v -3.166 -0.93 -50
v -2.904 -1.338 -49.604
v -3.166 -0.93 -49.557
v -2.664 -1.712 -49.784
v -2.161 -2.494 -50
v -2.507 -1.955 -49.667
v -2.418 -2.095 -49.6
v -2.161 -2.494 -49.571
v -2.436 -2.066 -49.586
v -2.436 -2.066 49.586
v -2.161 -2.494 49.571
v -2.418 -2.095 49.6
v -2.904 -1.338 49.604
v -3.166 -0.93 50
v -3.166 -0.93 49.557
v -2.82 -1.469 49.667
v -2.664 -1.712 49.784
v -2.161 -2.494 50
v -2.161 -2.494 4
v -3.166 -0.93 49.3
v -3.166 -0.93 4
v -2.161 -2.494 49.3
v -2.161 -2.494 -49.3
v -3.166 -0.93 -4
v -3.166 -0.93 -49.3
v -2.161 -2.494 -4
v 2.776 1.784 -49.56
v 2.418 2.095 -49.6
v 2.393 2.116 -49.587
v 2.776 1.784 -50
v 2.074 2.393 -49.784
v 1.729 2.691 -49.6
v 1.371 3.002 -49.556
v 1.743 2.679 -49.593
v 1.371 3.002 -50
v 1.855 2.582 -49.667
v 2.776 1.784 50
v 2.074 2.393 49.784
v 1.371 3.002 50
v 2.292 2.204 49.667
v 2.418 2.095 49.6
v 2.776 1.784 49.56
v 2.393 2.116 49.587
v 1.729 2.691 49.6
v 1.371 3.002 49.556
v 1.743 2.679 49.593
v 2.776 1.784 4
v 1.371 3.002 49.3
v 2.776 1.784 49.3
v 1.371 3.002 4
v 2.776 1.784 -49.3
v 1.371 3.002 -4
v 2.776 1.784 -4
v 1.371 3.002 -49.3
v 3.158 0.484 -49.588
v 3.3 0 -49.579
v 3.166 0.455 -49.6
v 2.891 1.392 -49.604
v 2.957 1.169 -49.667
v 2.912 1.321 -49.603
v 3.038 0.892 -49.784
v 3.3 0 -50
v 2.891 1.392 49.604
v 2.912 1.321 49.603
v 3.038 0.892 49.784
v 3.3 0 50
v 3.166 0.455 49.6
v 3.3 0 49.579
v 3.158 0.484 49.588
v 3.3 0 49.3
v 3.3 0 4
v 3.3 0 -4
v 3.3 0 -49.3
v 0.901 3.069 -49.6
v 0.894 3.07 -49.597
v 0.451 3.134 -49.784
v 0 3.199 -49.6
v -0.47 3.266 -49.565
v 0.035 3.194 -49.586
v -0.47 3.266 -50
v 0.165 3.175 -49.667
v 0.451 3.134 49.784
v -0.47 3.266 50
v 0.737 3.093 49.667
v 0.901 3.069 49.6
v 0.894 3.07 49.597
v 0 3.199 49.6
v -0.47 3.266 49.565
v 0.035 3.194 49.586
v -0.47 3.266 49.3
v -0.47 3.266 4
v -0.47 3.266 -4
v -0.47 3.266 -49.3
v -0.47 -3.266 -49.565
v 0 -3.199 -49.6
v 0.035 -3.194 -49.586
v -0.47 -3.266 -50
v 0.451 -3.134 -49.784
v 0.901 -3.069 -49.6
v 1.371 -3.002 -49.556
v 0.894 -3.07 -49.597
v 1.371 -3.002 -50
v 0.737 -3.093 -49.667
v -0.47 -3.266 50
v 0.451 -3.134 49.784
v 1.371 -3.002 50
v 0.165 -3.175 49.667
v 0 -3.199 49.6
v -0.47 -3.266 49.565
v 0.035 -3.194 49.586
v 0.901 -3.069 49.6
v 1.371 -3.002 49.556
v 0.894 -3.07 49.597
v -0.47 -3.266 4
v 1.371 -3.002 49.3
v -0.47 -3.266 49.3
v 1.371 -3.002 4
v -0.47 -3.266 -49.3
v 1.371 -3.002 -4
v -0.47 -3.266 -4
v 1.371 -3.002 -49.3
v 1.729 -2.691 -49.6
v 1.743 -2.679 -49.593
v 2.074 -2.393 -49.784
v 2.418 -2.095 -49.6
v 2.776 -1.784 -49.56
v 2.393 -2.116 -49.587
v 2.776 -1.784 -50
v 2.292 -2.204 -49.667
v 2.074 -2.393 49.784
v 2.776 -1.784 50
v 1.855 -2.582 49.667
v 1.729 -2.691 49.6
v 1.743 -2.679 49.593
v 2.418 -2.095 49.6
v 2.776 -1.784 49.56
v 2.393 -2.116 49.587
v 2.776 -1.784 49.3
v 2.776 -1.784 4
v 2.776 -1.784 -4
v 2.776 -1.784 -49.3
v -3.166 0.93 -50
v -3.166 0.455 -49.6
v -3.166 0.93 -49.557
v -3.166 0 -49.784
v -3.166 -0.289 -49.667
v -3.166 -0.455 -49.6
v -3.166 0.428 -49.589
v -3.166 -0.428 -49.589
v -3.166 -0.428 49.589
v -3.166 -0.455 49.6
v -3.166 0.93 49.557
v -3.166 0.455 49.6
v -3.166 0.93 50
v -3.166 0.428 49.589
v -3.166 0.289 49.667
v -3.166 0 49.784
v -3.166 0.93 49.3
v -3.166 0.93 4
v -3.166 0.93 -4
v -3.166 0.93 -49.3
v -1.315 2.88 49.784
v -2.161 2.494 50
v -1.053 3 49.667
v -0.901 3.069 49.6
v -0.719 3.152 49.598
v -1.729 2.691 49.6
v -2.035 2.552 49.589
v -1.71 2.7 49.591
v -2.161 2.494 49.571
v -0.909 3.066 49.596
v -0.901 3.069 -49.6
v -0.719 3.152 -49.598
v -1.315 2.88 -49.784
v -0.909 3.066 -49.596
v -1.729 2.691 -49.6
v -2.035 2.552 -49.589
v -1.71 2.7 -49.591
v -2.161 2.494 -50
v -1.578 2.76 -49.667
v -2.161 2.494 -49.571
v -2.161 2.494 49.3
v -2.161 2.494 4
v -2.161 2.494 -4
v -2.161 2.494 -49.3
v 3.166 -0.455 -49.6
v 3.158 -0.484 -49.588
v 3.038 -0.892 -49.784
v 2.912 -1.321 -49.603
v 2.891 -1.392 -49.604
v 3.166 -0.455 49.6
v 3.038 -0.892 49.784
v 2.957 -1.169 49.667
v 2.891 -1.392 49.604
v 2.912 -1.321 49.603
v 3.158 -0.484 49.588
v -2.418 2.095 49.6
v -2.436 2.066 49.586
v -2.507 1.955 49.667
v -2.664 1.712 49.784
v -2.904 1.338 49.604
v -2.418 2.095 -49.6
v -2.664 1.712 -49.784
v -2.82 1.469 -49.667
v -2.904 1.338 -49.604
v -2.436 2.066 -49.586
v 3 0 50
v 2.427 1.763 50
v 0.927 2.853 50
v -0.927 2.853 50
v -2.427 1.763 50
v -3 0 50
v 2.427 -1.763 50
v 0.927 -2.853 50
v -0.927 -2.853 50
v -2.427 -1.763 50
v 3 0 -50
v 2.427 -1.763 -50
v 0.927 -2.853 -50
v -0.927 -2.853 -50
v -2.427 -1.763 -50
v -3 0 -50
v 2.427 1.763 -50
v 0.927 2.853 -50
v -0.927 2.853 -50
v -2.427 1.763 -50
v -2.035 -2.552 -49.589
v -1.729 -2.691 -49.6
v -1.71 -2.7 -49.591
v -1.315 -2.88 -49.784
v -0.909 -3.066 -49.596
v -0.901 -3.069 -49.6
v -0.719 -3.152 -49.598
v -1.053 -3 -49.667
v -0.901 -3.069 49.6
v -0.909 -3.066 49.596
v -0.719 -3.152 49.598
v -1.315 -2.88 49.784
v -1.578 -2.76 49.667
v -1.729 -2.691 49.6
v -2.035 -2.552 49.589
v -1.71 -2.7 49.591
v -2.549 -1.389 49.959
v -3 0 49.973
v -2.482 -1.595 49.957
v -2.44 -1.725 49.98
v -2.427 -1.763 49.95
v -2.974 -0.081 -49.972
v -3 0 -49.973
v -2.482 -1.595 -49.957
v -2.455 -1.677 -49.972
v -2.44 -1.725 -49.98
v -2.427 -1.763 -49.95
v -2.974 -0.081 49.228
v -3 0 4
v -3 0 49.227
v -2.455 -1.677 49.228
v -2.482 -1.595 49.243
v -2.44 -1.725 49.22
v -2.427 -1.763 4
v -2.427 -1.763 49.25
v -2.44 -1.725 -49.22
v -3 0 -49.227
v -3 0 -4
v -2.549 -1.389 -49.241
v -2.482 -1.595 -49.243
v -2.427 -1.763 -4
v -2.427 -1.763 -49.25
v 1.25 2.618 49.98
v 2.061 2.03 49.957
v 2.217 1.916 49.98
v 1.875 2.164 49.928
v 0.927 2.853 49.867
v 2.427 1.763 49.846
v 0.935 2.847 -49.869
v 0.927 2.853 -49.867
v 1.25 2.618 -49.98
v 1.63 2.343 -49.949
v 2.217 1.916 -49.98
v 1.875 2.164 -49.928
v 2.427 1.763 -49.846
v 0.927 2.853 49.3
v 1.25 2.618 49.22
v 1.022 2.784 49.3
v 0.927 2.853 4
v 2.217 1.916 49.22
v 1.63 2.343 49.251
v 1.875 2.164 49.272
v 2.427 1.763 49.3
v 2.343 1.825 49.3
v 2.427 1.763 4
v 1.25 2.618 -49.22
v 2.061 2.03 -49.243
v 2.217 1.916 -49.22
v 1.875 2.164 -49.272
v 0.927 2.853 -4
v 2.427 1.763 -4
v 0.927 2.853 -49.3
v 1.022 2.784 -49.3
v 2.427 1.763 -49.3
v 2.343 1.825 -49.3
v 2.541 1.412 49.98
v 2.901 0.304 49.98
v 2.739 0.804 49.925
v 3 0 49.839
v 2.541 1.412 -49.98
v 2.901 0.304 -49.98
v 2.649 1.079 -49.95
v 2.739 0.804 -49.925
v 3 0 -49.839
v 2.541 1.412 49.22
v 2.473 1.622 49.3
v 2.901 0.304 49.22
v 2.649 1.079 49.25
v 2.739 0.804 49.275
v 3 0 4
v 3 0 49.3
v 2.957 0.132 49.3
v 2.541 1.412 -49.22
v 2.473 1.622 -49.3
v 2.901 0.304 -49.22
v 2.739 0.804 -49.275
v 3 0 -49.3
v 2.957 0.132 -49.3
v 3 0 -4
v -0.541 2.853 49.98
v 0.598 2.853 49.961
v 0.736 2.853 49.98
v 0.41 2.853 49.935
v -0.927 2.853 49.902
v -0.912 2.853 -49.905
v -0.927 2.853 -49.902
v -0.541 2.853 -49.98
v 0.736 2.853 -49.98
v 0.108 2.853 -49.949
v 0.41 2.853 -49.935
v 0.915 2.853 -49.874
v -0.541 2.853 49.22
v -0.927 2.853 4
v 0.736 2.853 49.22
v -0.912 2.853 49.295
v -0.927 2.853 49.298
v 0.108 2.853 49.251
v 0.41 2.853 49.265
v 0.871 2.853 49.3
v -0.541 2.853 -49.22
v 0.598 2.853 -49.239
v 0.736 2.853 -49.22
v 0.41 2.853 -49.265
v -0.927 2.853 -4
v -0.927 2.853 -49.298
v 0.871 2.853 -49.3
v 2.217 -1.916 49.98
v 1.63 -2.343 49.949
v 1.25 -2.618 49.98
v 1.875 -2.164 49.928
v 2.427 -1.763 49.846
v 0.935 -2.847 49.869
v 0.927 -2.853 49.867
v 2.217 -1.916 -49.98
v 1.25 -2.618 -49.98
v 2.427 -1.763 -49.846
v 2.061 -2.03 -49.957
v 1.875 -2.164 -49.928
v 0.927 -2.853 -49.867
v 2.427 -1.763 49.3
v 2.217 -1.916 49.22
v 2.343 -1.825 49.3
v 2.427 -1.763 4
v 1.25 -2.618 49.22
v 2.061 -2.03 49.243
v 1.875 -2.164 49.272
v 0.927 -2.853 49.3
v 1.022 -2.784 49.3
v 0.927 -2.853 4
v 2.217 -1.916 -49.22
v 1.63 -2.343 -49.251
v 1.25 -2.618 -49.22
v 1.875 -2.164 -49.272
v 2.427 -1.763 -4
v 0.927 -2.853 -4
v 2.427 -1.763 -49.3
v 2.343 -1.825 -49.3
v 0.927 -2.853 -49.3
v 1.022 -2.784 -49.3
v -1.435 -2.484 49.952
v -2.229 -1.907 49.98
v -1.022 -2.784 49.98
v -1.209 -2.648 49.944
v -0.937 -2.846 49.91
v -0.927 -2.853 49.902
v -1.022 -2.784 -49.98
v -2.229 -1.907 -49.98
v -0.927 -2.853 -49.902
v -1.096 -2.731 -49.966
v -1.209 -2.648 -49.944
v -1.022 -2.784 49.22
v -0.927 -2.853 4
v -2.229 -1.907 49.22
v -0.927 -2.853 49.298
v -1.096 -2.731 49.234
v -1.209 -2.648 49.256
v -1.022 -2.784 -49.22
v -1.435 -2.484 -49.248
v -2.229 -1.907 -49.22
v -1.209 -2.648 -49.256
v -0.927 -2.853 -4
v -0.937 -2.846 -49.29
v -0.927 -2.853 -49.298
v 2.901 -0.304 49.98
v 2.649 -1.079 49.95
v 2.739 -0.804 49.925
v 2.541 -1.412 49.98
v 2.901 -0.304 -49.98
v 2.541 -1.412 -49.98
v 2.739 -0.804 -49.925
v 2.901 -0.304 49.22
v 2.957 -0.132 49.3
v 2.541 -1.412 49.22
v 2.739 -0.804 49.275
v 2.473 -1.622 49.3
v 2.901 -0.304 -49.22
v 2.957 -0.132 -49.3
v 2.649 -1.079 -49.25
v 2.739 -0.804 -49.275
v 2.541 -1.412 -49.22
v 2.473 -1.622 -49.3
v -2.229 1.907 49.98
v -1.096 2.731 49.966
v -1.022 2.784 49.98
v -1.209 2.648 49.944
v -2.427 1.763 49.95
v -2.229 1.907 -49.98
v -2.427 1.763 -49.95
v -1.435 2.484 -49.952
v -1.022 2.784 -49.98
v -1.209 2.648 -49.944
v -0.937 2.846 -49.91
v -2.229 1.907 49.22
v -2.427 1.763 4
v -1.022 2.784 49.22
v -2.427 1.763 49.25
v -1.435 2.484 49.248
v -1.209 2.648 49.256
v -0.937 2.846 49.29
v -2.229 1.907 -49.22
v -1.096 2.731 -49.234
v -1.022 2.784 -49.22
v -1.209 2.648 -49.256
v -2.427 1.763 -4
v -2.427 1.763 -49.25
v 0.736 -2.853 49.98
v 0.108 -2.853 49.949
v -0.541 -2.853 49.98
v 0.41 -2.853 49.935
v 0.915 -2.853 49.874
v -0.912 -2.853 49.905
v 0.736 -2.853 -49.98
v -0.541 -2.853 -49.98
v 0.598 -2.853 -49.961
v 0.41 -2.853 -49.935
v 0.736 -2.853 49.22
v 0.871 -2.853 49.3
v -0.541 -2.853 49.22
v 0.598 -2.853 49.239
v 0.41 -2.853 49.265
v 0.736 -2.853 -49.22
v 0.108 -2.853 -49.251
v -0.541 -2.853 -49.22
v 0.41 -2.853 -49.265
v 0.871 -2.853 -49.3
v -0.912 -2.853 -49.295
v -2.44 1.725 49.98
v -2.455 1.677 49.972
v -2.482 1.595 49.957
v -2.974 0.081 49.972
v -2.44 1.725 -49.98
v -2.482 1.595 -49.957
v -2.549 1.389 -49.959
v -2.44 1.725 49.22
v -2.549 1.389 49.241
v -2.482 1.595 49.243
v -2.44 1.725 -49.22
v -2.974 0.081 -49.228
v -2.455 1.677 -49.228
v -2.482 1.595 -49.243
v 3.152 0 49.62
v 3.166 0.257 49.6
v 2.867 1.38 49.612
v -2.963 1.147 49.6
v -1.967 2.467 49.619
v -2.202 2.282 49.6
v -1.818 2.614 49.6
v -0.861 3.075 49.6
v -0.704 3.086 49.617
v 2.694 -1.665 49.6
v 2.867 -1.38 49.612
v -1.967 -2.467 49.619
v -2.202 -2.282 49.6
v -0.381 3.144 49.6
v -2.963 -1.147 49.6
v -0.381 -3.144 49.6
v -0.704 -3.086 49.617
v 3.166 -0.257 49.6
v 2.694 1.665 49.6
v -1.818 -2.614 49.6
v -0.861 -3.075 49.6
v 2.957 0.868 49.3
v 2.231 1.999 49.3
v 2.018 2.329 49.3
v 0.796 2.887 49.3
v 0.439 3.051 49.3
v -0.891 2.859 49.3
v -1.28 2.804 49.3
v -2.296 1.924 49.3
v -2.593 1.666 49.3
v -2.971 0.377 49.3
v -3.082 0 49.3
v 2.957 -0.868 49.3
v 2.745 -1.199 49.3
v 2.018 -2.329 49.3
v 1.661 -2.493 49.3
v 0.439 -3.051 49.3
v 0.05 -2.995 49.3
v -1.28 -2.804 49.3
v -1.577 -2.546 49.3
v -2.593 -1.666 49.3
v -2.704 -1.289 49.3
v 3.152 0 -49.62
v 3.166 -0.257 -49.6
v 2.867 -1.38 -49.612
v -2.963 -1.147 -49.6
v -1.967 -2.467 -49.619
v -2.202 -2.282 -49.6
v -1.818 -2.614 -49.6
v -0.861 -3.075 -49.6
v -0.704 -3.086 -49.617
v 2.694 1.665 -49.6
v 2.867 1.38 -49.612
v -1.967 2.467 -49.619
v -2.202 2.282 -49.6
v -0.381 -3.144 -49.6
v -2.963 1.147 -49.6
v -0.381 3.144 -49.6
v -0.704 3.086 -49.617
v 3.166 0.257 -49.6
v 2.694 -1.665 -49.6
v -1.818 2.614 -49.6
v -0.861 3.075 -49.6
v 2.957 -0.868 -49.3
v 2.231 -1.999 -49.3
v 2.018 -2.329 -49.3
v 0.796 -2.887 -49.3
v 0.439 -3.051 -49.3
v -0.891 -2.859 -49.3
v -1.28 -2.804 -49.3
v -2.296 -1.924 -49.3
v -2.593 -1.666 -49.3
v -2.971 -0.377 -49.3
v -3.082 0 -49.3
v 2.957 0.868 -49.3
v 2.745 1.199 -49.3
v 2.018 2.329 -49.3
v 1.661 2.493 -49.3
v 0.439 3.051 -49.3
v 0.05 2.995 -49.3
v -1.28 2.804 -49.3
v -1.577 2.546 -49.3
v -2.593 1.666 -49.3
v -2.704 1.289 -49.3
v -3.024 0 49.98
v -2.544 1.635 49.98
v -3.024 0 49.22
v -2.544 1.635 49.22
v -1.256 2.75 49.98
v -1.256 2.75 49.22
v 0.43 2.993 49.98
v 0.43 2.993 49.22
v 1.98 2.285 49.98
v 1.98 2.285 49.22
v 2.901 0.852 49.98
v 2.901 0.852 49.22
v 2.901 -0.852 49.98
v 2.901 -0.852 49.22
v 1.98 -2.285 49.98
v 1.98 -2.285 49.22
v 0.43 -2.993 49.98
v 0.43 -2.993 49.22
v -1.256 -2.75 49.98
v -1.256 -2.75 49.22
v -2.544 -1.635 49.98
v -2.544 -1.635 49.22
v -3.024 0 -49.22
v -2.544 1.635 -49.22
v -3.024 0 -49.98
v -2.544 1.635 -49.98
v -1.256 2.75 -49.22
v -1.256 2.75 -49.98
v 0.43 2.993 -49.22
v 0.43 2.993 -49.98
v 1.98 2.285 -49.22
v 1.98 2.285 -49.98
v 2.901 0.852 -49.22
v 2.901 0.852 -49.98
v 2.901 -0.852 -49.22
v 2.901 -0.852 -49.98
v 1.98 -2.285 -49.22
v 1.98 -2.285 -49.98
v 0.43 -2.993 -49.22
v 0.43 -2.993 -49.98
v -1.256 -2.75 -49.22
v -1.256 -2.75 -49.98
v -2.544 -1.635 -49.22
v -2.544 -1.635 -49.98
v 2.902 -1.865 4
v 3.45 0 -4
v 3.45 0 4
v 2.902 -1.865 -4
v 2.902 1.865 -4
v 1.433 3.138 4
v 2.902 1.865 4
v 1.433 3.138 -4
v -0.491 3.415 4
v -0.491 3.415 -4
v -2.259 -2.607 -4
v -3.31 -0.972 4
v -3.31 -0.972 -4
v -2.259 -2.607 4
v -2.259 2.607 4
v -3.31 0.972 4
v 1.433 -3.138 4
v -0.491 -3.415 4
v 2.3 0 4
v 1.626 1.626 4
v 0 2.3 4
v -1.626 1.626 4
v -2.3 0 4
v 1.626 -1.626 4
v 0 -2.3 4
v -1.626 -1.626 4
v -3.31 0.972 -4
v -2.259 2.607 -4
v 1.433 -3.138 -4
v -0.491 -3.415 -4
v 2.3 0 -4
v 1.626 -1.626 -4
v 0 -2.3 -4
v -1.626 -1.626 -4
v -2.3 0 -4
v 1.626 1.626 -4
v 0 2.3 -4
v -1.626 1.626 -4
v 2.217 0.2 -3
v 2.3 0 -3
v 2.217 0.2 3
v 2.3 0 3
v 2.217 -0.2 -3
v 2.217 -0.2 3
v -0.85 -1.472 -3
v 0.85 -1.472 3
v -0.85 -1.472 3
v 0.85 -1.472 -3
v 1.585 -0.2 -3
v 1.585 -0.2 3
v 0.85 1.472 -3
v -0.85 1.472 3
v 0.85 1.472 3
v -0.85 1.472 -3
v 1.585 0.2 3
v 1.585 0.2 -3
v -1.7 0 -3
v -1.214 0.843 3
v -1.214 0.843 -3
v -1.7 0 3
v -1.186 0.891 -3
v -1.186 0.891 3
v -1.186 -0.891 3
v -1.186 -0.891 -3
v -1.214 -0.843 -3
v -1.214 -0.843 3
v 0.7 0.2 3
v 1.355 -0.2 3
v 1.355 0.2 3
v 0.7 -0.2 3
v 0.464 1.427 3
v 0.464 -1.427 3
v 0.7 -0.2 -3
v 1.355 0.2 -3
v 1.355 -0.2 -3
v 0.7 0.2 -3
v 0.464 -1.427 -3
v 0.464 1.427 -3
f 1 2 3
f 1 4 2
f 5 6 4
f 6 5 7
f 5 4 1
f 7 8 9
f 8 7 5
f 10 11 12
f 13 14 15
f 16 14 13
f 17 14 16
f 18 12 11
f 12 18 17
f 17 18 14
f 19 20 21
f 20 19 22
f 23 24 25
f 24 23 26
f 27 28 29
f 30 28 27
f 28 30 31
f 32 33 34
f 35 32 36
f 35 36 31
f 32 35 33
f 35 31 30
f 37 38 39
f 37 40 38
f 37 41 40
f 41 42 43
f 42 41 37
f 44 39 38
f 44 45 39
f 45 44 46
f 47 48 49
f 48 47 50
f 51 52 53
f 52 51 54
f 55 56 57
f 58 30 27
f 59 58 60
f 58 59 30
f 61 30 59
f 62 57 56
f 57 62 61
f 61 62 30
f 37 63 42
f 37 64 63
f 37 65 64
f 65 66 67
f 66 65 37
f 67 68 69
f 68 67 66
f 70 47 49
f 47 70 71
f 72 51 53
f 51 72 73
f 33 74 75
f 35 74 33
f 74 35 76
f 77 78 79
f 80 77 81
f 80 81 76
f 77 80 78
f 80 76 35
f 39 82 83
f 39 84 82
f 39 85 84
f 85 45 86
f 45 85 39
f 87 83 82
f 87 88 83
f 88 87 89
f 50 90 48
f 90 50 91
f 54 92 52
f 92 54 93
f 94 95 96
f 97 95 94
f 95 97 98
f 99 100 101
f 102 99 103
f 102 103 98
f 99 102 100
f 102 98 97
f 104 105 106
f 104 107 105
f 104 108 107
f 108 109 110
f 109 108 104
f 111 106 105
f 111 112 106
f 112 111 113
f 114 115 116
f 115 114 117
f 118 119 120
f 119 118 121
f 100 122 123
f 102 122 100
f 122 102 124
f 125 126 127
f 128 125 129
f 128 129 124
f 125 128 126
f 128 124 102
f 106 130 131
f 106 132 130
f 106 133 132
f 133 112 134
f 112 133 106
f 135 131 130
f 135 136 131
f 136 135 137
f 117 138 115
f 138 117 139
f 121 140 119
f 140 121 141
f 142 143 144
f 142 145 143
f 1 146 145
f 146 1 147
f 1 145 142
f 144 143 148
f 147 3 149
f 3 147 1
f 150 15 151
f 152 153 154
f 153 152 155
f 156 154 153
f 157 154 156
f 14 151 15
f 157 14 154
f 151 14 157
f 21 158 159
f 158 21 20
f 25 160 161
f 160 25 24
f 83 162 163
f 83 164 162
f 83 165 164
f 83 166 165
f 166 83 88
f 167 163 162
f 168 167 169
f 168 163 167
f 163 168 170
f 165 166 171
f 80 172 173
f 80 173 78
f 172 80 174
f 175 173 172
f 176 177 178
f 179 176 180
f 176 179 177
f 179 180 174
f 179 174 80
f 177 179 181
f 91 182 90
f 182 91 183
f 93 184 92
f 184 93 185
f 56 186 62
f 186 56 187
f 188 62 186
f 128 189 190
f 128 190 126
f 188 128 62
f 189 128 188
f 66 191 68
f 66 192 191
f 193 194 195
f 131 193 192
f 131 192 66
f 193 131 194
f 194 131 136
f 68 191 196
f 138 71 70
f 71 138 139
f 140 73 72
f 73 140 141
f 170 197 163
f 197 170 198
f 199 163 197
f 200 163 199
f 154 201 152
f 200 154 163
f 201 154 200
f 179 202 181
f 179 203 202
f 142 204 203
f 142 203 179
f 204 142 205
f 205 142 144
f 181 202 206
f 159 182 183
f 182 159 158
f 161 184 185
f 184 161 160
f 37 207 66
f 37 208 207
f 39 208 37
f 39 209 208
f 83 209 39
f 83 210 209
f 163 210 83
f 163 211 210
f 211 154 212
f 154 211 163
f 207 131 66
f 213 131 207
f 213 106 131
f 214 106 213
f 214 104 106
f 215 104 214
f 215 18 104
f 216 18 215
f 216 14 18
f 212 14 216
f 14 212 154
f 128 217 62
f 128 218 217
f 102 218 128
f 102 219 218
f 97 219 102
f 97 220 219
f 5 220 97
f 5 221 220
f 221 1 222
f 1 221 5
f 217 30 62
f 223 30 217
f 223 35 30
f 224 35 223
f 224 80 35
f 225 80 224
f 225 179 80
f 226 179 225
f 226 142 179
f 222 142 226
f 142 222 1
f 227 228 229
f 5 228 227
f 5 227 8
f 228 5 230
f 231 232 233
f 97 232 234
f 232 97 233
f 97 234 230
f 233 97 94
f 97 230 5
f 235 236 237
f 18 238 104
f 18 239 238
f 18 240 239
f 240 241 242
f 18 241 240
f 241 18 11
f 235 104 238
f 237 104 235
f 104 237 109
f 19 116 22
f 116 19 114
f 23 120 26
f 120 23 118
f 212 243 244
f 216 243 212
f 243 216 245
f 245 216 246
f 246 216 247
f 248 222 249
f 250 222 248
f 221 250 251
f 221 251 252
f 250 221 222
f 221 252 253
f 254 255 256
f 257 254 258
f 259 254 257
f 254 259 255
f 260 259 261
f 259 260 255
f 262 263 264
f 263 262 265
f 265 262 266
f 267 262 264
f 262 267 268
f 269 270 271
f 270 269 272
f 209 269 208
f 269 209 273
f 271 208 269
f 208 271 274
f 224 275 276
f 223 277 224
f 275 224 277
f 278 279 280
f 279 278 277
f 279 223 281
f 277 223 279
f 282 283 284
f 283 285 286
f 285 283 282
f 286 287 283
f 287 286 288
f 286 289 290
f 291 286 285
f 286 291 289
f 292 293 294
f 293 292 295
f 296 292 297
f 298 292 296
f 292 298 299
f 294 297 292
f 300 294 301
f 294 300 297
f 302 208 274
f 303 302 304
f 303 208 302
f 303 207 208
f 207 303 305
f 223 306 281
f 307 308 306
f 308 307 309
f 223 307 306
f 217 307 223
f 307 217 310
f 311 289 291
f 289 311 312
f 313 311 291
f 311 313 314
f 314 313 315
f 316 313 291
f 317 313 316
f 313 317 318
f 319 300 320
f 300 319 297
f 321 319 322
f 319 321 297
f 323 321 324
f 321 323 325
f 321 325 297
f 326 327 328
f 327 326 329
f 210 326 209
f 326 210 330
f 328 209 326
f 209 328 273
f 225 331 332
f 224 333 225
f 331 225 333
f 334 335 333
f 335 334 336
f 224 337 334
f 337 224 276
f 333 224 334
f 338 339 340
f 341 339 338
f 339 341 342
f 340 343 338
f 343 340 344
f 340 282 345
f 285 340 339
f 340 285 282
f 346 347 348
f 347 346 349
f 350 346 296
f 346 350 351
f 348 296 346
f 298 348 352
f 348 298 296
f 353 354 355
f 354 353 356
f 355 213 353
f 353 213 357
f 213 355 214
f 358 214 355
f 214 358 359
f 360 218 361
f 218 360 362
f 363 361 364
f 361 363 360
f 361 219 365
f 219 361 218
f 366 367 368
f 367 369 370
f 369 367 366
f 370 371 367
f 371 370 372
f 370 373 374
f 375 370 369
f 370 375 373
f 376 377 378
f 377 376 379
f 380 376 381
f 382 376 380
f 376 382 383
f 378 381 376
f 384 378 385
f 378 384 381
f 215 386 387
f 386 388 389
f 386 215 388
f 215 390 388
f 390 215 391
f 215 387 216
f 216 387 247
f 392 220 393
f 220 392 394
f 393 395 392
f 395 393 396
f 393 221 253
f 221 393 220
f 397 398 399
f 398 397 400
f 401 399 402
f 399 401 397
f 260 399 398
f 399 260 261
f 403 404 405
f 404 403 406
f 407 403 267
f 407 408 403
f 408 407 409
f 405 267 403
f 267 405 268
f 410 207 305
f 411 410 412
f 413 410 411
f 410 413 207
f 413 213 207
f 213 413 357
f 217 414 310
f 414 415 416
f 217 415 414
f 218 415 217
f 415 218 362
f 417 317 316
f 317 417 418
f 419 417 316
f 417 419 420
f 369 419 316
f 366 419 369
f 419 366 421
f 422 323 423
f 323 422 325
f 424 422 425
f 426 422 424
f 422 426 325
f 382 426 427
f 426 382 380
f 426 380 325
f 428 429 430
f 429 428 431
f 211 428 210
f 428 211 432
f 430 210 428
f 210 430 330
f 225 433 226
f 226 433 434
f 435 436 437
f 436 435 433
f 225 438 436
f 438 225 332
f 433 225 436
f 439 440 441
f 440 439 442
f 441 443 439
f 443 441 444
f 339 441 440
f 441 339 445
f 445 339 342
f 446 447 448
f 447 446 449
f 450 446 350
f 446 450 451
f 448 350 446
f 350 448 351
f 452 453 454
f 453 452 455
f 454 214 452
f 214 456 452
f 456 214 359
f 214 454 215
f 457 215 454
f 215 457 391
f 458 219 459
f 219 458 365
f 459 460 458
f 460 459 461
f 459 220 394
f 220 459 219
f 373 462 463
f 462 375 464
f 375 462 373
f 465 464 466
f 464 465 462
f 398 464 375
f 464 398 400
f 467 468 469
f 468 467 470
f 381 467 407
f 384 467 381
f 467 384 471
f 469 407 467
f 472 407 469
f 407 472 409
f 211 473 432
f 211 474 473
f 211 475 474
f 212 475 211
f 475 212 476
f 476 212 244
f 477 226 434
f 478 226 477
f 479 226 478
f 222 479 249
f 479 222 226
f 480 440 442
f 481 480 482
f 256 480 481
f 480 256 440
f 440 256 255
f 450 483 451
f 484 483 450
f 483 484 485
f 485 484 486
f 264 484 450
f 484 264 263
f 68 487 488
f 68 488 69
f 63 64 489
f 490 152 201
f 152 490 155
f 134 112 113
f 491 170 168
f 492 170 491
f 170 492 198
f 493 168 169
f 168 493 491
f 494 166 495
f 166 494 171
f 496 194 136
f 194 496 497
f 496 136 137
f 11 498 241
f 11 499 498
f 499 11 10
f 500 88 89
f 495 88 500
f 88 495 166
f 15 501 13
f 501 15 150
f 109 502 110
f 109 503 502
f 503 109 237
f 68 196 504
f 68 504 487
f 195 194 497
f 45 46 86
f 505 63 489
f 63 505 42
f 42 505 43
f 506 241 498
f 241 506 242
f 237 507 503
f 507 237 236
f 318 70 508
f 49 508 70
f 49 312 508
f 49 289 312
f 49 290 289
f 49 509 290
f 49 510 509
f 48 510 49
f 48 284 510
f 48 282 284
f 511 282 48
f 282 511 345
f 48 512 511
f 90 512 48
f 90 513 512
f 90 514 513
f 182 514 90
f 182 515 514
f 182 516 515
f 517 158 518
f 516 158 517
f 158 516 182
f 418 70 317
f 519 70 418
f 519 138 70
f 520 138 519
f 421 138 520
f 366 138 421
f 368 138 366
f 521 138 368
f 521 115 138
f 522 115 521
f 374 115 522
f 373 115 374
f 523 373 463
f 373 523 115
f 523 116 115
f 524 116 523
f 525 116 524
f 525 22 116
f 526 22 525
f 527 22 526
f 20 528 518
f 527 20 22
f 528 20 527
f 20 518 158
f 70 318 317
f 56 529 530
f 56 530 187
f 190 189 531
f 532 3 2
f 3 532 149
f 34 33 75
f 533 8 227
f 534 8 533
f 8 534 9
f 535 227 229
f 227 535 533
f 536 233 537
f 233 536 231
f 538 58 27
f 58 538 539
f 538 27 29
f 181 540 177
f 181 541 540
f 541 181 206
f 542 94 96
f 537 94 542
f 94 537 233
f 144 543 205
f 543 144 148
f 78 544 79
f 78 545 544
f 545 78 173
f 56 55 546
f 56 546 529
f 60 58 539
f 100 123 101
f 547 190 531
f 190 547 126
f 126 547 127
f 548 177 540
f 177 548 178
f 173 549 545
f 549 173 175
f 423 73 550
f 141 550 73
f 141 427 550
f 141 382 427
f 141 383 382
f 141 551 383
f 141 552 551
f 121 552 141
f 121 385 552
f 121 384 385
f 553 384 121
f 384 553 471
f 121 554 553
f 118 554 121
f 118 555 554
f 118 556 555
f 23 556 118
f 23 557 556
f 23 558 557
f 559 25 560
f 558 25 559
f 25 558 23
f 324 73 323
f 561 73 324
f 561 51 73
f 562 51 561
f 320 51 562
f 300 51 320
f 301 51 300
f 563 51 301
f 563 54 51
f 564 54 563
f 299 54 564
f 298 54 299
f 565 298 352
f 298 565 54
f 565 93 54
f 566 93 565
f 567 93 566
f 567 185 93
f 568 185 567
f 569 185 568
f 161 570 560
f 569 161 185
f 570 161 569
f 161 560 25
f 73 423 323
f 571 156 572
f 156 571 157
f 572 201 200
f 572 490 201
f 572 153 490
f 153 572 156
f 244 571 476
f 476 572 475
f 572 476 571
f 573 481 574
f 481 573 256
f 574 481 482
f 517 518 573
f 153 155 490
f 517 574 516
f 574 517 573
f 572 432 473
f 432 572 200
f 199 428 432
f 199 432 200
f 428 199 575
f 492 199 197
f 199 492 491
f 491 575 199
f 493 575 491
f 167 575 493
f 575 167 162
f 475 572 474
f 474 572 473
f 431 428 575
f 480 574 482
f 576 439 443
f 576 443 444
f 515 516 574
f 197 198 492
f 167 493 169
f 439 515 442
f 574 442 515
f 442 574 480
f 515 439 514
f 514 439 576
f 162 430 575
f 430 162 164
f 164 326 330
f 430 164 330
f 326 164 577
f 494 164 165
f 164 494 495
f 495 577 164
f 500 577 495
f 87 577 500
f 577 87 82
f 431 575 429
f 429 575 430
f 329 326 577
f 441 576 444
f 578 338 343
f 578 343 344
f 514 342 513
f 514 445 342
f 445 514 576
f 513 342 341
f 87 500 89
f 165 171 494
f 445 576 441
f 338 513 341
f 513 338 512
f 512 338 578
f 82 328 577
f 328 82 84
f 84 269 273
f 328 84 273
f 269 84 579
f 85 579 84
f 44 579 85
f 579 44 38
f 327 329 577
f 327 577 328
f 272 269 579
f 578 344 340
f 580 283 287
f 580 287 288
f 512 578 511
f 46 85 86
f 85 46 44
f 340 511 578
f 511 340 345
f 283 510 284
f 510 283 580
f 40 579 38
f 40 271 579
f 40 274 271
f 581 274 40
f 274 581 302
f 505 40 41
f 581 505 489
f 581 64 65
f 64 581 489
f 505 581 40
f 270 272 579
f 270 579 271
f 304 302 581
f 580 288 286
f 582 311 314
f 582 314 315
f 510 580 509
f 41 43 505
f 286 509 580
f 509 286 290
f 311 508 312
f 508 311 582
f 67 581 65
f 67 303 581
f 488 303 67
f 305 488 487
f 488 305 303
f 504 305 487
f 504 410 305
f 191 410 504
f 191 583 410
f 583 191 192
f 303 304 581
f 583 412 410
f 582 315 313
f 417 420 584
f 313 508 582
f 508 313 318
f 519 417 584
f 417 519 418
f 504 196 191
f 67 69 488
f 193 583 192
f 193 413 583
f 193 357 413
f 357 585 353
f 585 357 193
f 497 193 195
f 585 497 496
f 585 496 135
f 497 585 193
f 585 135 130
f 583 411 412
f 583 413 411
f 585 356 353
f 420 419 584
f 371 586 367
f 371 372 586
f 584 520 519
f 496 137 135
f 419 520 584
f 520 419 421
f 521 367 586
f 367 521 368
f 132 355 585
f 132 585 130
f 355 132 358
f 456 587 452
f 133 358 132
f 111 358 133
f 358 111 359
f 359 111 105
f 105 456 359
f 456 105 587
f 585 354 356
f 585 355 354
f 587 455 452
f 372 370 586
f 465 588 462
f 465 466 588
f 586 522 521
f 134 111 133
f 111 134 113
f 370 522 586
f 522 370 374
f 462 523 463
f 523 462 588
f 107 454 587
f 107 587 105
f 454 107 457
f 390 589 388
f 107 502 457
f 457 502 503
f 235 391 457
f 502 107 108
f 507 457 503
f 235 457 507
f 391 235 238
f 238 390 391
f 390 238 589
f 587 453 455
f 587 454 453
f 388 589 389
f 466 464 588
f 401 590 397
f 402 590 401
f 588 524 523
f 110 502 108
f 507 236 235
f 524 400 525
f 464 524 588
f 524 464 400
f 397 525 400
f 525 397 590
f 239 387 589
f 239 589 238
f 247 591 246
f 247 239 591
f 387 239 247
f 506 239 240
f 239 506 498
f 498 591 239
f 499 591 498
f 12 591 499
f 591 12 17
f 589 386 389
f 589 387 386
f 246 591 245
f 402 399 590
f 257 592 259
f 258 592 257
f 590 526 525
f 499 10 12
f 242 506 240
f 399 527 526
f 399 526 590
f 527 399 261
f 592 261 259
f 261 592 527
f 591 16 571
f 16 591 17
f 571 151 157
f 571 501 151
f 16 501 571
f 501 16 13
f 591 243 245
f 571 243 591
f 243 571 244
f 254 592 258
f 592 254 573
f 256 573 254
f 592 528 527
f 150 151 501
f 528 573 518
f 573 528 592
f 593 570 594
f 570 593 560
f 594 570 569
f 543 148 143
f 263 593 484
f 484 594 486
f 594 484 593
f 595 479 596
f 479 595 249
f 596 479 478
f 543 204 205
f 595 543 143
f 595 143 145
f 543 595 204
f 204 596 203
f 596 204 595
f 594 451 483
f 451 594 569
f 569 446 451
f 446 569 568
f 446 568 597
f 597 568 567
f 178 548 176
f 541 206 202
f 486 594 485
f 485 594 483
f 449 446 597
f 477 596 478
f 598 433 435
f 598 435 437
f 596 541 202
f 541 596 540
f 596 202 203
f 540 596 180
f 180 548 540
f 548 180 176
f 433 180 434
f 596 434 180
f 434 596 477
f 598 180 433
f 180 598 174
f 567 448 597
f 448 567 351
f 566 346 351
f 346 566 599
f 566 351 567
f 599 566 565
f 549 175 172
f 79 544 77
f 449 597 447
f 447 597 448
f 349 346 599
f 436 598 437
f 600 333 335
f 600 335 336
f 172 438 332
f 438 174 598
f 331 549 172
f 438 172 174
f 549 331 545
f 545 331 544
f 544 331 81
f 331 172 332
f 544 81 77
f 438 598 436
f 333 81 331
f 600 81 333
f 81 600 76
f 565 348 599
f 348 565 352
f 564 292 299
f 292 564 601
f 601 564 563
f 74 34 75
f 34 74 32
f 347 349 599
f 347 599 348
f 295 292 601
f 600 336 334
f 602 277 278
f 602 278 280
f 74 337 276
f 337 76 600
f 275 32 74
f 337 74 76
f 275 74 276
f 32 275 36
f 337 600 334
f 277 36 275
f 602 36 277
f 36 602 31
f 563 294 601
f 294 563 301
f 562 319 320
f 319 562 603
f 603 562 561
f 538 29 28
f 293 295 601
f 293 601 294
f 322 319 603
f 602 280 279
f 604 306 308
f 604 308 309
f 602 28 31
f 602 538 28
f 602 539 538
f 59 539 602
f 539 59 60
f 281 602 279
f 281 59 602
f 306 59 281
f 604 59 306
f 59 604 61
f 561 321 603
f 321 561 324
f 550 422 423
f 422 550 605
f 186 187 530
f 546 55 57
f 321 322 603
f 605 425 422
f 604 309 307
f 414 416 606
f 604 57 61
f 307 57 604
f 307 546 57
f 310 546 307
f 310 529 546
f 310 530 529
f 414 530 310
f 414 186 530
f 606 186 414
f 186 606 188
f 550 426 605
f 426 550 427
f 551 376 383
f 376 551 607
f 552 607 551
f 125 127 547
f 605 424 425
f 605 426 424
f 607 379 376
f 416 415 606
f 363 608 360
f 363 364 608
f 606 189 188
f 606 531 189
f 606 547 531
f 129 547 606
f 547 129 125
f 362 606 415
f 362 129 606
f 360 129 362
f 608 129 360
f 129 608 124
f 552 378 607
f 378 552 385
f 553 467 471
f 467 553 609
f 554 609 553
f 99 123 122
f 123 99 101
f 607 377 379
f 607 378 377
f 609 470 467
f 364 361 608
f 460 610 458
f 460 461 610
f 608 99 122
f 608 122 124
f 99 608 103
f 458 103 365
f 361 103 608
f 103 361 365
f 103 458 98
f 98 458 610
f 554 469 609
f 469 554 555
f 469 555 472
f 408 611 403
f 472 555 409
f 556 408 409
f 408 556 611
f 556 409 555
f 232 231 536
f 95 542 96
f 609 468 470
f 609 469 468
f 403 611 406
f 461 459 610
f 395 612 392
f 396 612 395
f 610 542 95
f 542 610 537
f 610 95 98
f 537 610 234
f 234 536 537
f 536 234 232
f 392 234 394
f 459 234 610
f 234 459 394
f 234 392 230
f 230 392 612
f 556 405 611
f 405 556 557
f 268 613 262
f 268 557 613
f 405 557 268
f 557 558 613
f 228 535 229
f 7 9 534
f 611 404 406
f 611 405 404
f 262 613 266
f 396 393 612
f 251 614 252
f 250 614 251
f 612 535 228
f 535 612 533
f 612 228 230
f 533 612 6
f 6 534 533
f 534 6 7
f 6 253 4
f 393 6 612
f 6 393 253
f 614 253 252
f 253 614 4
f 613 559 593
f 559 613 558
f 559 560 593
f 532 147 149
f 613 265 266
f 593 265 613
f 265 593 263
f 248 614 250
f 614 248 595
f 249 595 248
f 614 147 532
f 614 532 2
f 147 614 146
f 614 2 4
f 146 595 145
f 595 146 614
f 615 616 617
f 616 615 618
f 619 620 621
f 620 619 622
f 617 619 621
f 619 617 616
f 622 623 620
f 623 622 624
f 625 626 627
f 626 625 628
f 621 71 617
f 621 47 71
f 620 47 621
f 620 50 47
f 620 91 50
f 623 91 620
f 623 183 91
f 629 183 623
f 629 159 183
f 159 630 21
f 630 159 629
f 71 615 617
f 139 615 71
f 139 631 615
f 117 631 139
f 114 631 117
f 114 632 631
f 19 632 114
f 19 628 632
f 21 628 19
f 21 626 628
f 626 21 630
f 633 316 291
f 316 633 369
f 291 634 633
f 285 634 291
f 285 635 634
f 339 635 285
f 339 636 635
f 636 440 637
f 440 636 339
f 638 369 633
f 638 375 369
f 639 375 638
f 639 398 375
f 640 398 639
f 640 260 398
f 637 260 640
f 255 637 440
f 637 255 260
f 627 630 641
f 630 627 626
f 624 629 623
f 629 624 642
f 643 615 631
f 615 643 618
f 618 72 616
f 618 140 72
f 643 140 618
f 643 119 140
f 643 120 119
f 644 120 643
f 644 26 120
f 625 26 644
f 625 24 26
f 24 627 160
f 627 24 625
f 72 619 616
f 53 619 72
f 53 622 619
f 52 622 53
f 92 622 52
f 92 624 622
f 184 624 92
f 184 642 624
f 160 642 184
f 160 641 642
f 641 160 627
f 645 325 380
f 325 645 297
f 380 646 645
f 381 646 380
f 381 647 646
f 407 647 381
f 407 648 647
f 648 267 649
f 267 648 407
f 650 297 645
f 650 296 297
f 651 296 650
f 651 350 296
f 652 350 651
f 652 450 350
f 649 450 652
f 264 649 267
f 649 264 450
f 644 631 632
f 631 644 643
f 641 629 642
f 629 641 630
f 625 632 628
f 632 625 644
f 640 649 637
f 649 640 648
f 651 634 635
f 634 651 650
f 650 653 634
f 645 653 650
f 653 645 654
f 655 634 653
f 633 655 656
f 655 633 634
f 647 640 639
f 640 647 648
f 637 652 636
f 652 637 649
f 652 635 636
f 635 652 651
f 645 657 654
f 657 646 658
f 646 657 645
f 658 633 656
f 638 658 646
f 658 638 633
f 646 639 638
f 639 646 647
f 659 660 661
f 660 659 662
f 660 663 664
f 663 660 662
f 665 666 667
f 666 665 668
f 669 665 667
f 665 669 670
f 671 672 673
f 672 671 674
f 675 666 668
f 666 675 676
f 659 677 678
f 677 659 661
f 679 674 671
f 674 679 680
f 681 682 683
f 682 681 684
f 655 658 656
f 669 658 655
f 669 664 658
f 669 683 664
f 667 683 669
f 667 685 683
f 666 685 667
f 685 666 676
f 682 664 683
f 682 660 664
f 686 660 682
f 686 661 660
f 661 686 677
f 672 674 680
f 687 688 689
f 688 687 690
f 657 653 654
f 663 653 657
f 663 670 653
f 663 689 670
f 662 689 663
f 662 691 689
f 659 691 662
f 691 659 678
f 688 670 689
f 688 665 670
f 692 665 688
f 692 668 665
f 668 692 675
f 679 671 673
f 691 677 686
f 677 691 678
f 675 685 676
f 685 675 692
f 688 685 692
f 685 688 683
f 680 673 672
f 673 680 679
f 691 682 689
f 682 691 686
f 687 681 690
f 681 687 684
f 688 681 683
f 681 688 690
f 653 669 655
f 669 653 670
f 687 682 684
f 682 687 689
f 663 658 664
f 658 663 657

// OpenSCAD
// Parameters
L = 100; //[50:200:1]
ID = 6; //[3:12:0.1]
t = 0.3; //[0.15:0.6:0.05]
OD = 6.6; //[3.3:13.2:0.1]
shrink_ratio = 2; //[1.2:4:0.1]
ID_shrunk = 3; //[1.5:6:0.1]
overlap = 1; //[0.5:2:0.1]
chamfer_len = 1.2; //[0.6:2.4:0.1]
edge_round_r = 0.4; //[0.2:0.8:0.05]
mark_band_w = 8; //[4:16:0.5]
mark_band_t = 0.15; //[0.05:0.3:0.05]
post_ref_w = 6; //[3:12:0.5]
post_ref_t = 0.2; //[0.1:0.5:0.05]

// Base Shapes
module sleeve_outer_cyl() {
  cylinder(h=L, r=OD/2, center=true);
}

module inner_bore_cyl() {
  cylinder(h=L + 2*overlap, r=ID/2, center=true);
}

module chamfer_cut_top_cone() {
  translate([0, 0, L/2 - chamfer_len/2 + overlap/2])
    cylinder(h=chamfer_len, r1=OD/2 + overlap, r2=0, center=true);
}

module chamfer_cut_bottom_cone() {
  translate([0, 0, -L/2 + chamfer_len/2 - overlap/2])
    rotate([180, 0, 0])
    cylinder(h=chamfer_len, r1=OD/2 + overlap, r2=0, center=true);
}

module edge_round_top_torus() {
  translate([0, 0, L/2 - edge_round_r])
    rotate_extrude()
    translate([OD/2 - edge_round_r, 0, 0])
    circle(r=edge_round_r);
}

module edge_round_bottom_torus() {
  translate([0, 0, -L/2 + edge_round_r])
    rotate_extrude()
    translate([OD/2 - edge_round_r, 0, 0])
    circle(r=edge_round_r);
}

module printed_marking_band_outer() {
  cylinder(h=mark_band_w, r=OD/2 + mark_band_t, center=true);
}

module printed_marking_band_inner_clear() {
  cylinder(h=mark_band_w + 2*overlap, r=OD/2 - overlap, center=true);
}

module post_shrink_ref_outer() {
  cylinder(h=post_ref_w, r=(ID_shrunk/2) + post_ref_t, center=true);
}

module post_shrink_ref_inner() {
  cylinder(h=post_ref_w + 2*overlap, r=ID_shrunk/2, center=true);
}

module post_shrink_ref_attach_spoke() {
  translate([((ID_shrunk/2 + post_ref_t) + (ID/2))/2 - overlap/2, 0, 0])
    cube([(ID/2 - (ID_shrunk/2 + post_ref_t)) + overlap, post_ref_t*2, post_ref_w], center=true);
}

// Operations
module sleeve_tube() {
  difference() {
    sleeve_outer_cyl();
    inner_bore_cyl();
  }
}

module end_chamfers() {
  difference() {
    sleeve_tube();
    chamfer_cut_top_cone();
    chamfer_cut_bottom_cone();
  }
}

module cut_edge_rounding() {
  difference() {
    end_chamfers();
    edge_round_top_torus();
    edge_round_bottom_torus();
  }
}

module printed_marking_band() {
  difference() {
    printed_marking_band_outer();
    printed_marking_band_inner_clear();
  }
}

module post_shrink_reference_state_ring() {
  difference() {
    post_shrink_ref_outer();
    post_shrink_ref_inner();
  }
}

module post_shrink_reference_state() {
  union() {
    post_shrink_reference_state_ring();
    post_shrink_ref_attach_spoke();
  }
}

// Final Model
module complete_model() {
  union() {
    cut_edge_rounding();
    printed_marking_band();
    post_shrink_reference_state();
  }
}

// Render the final output
complete_model();
